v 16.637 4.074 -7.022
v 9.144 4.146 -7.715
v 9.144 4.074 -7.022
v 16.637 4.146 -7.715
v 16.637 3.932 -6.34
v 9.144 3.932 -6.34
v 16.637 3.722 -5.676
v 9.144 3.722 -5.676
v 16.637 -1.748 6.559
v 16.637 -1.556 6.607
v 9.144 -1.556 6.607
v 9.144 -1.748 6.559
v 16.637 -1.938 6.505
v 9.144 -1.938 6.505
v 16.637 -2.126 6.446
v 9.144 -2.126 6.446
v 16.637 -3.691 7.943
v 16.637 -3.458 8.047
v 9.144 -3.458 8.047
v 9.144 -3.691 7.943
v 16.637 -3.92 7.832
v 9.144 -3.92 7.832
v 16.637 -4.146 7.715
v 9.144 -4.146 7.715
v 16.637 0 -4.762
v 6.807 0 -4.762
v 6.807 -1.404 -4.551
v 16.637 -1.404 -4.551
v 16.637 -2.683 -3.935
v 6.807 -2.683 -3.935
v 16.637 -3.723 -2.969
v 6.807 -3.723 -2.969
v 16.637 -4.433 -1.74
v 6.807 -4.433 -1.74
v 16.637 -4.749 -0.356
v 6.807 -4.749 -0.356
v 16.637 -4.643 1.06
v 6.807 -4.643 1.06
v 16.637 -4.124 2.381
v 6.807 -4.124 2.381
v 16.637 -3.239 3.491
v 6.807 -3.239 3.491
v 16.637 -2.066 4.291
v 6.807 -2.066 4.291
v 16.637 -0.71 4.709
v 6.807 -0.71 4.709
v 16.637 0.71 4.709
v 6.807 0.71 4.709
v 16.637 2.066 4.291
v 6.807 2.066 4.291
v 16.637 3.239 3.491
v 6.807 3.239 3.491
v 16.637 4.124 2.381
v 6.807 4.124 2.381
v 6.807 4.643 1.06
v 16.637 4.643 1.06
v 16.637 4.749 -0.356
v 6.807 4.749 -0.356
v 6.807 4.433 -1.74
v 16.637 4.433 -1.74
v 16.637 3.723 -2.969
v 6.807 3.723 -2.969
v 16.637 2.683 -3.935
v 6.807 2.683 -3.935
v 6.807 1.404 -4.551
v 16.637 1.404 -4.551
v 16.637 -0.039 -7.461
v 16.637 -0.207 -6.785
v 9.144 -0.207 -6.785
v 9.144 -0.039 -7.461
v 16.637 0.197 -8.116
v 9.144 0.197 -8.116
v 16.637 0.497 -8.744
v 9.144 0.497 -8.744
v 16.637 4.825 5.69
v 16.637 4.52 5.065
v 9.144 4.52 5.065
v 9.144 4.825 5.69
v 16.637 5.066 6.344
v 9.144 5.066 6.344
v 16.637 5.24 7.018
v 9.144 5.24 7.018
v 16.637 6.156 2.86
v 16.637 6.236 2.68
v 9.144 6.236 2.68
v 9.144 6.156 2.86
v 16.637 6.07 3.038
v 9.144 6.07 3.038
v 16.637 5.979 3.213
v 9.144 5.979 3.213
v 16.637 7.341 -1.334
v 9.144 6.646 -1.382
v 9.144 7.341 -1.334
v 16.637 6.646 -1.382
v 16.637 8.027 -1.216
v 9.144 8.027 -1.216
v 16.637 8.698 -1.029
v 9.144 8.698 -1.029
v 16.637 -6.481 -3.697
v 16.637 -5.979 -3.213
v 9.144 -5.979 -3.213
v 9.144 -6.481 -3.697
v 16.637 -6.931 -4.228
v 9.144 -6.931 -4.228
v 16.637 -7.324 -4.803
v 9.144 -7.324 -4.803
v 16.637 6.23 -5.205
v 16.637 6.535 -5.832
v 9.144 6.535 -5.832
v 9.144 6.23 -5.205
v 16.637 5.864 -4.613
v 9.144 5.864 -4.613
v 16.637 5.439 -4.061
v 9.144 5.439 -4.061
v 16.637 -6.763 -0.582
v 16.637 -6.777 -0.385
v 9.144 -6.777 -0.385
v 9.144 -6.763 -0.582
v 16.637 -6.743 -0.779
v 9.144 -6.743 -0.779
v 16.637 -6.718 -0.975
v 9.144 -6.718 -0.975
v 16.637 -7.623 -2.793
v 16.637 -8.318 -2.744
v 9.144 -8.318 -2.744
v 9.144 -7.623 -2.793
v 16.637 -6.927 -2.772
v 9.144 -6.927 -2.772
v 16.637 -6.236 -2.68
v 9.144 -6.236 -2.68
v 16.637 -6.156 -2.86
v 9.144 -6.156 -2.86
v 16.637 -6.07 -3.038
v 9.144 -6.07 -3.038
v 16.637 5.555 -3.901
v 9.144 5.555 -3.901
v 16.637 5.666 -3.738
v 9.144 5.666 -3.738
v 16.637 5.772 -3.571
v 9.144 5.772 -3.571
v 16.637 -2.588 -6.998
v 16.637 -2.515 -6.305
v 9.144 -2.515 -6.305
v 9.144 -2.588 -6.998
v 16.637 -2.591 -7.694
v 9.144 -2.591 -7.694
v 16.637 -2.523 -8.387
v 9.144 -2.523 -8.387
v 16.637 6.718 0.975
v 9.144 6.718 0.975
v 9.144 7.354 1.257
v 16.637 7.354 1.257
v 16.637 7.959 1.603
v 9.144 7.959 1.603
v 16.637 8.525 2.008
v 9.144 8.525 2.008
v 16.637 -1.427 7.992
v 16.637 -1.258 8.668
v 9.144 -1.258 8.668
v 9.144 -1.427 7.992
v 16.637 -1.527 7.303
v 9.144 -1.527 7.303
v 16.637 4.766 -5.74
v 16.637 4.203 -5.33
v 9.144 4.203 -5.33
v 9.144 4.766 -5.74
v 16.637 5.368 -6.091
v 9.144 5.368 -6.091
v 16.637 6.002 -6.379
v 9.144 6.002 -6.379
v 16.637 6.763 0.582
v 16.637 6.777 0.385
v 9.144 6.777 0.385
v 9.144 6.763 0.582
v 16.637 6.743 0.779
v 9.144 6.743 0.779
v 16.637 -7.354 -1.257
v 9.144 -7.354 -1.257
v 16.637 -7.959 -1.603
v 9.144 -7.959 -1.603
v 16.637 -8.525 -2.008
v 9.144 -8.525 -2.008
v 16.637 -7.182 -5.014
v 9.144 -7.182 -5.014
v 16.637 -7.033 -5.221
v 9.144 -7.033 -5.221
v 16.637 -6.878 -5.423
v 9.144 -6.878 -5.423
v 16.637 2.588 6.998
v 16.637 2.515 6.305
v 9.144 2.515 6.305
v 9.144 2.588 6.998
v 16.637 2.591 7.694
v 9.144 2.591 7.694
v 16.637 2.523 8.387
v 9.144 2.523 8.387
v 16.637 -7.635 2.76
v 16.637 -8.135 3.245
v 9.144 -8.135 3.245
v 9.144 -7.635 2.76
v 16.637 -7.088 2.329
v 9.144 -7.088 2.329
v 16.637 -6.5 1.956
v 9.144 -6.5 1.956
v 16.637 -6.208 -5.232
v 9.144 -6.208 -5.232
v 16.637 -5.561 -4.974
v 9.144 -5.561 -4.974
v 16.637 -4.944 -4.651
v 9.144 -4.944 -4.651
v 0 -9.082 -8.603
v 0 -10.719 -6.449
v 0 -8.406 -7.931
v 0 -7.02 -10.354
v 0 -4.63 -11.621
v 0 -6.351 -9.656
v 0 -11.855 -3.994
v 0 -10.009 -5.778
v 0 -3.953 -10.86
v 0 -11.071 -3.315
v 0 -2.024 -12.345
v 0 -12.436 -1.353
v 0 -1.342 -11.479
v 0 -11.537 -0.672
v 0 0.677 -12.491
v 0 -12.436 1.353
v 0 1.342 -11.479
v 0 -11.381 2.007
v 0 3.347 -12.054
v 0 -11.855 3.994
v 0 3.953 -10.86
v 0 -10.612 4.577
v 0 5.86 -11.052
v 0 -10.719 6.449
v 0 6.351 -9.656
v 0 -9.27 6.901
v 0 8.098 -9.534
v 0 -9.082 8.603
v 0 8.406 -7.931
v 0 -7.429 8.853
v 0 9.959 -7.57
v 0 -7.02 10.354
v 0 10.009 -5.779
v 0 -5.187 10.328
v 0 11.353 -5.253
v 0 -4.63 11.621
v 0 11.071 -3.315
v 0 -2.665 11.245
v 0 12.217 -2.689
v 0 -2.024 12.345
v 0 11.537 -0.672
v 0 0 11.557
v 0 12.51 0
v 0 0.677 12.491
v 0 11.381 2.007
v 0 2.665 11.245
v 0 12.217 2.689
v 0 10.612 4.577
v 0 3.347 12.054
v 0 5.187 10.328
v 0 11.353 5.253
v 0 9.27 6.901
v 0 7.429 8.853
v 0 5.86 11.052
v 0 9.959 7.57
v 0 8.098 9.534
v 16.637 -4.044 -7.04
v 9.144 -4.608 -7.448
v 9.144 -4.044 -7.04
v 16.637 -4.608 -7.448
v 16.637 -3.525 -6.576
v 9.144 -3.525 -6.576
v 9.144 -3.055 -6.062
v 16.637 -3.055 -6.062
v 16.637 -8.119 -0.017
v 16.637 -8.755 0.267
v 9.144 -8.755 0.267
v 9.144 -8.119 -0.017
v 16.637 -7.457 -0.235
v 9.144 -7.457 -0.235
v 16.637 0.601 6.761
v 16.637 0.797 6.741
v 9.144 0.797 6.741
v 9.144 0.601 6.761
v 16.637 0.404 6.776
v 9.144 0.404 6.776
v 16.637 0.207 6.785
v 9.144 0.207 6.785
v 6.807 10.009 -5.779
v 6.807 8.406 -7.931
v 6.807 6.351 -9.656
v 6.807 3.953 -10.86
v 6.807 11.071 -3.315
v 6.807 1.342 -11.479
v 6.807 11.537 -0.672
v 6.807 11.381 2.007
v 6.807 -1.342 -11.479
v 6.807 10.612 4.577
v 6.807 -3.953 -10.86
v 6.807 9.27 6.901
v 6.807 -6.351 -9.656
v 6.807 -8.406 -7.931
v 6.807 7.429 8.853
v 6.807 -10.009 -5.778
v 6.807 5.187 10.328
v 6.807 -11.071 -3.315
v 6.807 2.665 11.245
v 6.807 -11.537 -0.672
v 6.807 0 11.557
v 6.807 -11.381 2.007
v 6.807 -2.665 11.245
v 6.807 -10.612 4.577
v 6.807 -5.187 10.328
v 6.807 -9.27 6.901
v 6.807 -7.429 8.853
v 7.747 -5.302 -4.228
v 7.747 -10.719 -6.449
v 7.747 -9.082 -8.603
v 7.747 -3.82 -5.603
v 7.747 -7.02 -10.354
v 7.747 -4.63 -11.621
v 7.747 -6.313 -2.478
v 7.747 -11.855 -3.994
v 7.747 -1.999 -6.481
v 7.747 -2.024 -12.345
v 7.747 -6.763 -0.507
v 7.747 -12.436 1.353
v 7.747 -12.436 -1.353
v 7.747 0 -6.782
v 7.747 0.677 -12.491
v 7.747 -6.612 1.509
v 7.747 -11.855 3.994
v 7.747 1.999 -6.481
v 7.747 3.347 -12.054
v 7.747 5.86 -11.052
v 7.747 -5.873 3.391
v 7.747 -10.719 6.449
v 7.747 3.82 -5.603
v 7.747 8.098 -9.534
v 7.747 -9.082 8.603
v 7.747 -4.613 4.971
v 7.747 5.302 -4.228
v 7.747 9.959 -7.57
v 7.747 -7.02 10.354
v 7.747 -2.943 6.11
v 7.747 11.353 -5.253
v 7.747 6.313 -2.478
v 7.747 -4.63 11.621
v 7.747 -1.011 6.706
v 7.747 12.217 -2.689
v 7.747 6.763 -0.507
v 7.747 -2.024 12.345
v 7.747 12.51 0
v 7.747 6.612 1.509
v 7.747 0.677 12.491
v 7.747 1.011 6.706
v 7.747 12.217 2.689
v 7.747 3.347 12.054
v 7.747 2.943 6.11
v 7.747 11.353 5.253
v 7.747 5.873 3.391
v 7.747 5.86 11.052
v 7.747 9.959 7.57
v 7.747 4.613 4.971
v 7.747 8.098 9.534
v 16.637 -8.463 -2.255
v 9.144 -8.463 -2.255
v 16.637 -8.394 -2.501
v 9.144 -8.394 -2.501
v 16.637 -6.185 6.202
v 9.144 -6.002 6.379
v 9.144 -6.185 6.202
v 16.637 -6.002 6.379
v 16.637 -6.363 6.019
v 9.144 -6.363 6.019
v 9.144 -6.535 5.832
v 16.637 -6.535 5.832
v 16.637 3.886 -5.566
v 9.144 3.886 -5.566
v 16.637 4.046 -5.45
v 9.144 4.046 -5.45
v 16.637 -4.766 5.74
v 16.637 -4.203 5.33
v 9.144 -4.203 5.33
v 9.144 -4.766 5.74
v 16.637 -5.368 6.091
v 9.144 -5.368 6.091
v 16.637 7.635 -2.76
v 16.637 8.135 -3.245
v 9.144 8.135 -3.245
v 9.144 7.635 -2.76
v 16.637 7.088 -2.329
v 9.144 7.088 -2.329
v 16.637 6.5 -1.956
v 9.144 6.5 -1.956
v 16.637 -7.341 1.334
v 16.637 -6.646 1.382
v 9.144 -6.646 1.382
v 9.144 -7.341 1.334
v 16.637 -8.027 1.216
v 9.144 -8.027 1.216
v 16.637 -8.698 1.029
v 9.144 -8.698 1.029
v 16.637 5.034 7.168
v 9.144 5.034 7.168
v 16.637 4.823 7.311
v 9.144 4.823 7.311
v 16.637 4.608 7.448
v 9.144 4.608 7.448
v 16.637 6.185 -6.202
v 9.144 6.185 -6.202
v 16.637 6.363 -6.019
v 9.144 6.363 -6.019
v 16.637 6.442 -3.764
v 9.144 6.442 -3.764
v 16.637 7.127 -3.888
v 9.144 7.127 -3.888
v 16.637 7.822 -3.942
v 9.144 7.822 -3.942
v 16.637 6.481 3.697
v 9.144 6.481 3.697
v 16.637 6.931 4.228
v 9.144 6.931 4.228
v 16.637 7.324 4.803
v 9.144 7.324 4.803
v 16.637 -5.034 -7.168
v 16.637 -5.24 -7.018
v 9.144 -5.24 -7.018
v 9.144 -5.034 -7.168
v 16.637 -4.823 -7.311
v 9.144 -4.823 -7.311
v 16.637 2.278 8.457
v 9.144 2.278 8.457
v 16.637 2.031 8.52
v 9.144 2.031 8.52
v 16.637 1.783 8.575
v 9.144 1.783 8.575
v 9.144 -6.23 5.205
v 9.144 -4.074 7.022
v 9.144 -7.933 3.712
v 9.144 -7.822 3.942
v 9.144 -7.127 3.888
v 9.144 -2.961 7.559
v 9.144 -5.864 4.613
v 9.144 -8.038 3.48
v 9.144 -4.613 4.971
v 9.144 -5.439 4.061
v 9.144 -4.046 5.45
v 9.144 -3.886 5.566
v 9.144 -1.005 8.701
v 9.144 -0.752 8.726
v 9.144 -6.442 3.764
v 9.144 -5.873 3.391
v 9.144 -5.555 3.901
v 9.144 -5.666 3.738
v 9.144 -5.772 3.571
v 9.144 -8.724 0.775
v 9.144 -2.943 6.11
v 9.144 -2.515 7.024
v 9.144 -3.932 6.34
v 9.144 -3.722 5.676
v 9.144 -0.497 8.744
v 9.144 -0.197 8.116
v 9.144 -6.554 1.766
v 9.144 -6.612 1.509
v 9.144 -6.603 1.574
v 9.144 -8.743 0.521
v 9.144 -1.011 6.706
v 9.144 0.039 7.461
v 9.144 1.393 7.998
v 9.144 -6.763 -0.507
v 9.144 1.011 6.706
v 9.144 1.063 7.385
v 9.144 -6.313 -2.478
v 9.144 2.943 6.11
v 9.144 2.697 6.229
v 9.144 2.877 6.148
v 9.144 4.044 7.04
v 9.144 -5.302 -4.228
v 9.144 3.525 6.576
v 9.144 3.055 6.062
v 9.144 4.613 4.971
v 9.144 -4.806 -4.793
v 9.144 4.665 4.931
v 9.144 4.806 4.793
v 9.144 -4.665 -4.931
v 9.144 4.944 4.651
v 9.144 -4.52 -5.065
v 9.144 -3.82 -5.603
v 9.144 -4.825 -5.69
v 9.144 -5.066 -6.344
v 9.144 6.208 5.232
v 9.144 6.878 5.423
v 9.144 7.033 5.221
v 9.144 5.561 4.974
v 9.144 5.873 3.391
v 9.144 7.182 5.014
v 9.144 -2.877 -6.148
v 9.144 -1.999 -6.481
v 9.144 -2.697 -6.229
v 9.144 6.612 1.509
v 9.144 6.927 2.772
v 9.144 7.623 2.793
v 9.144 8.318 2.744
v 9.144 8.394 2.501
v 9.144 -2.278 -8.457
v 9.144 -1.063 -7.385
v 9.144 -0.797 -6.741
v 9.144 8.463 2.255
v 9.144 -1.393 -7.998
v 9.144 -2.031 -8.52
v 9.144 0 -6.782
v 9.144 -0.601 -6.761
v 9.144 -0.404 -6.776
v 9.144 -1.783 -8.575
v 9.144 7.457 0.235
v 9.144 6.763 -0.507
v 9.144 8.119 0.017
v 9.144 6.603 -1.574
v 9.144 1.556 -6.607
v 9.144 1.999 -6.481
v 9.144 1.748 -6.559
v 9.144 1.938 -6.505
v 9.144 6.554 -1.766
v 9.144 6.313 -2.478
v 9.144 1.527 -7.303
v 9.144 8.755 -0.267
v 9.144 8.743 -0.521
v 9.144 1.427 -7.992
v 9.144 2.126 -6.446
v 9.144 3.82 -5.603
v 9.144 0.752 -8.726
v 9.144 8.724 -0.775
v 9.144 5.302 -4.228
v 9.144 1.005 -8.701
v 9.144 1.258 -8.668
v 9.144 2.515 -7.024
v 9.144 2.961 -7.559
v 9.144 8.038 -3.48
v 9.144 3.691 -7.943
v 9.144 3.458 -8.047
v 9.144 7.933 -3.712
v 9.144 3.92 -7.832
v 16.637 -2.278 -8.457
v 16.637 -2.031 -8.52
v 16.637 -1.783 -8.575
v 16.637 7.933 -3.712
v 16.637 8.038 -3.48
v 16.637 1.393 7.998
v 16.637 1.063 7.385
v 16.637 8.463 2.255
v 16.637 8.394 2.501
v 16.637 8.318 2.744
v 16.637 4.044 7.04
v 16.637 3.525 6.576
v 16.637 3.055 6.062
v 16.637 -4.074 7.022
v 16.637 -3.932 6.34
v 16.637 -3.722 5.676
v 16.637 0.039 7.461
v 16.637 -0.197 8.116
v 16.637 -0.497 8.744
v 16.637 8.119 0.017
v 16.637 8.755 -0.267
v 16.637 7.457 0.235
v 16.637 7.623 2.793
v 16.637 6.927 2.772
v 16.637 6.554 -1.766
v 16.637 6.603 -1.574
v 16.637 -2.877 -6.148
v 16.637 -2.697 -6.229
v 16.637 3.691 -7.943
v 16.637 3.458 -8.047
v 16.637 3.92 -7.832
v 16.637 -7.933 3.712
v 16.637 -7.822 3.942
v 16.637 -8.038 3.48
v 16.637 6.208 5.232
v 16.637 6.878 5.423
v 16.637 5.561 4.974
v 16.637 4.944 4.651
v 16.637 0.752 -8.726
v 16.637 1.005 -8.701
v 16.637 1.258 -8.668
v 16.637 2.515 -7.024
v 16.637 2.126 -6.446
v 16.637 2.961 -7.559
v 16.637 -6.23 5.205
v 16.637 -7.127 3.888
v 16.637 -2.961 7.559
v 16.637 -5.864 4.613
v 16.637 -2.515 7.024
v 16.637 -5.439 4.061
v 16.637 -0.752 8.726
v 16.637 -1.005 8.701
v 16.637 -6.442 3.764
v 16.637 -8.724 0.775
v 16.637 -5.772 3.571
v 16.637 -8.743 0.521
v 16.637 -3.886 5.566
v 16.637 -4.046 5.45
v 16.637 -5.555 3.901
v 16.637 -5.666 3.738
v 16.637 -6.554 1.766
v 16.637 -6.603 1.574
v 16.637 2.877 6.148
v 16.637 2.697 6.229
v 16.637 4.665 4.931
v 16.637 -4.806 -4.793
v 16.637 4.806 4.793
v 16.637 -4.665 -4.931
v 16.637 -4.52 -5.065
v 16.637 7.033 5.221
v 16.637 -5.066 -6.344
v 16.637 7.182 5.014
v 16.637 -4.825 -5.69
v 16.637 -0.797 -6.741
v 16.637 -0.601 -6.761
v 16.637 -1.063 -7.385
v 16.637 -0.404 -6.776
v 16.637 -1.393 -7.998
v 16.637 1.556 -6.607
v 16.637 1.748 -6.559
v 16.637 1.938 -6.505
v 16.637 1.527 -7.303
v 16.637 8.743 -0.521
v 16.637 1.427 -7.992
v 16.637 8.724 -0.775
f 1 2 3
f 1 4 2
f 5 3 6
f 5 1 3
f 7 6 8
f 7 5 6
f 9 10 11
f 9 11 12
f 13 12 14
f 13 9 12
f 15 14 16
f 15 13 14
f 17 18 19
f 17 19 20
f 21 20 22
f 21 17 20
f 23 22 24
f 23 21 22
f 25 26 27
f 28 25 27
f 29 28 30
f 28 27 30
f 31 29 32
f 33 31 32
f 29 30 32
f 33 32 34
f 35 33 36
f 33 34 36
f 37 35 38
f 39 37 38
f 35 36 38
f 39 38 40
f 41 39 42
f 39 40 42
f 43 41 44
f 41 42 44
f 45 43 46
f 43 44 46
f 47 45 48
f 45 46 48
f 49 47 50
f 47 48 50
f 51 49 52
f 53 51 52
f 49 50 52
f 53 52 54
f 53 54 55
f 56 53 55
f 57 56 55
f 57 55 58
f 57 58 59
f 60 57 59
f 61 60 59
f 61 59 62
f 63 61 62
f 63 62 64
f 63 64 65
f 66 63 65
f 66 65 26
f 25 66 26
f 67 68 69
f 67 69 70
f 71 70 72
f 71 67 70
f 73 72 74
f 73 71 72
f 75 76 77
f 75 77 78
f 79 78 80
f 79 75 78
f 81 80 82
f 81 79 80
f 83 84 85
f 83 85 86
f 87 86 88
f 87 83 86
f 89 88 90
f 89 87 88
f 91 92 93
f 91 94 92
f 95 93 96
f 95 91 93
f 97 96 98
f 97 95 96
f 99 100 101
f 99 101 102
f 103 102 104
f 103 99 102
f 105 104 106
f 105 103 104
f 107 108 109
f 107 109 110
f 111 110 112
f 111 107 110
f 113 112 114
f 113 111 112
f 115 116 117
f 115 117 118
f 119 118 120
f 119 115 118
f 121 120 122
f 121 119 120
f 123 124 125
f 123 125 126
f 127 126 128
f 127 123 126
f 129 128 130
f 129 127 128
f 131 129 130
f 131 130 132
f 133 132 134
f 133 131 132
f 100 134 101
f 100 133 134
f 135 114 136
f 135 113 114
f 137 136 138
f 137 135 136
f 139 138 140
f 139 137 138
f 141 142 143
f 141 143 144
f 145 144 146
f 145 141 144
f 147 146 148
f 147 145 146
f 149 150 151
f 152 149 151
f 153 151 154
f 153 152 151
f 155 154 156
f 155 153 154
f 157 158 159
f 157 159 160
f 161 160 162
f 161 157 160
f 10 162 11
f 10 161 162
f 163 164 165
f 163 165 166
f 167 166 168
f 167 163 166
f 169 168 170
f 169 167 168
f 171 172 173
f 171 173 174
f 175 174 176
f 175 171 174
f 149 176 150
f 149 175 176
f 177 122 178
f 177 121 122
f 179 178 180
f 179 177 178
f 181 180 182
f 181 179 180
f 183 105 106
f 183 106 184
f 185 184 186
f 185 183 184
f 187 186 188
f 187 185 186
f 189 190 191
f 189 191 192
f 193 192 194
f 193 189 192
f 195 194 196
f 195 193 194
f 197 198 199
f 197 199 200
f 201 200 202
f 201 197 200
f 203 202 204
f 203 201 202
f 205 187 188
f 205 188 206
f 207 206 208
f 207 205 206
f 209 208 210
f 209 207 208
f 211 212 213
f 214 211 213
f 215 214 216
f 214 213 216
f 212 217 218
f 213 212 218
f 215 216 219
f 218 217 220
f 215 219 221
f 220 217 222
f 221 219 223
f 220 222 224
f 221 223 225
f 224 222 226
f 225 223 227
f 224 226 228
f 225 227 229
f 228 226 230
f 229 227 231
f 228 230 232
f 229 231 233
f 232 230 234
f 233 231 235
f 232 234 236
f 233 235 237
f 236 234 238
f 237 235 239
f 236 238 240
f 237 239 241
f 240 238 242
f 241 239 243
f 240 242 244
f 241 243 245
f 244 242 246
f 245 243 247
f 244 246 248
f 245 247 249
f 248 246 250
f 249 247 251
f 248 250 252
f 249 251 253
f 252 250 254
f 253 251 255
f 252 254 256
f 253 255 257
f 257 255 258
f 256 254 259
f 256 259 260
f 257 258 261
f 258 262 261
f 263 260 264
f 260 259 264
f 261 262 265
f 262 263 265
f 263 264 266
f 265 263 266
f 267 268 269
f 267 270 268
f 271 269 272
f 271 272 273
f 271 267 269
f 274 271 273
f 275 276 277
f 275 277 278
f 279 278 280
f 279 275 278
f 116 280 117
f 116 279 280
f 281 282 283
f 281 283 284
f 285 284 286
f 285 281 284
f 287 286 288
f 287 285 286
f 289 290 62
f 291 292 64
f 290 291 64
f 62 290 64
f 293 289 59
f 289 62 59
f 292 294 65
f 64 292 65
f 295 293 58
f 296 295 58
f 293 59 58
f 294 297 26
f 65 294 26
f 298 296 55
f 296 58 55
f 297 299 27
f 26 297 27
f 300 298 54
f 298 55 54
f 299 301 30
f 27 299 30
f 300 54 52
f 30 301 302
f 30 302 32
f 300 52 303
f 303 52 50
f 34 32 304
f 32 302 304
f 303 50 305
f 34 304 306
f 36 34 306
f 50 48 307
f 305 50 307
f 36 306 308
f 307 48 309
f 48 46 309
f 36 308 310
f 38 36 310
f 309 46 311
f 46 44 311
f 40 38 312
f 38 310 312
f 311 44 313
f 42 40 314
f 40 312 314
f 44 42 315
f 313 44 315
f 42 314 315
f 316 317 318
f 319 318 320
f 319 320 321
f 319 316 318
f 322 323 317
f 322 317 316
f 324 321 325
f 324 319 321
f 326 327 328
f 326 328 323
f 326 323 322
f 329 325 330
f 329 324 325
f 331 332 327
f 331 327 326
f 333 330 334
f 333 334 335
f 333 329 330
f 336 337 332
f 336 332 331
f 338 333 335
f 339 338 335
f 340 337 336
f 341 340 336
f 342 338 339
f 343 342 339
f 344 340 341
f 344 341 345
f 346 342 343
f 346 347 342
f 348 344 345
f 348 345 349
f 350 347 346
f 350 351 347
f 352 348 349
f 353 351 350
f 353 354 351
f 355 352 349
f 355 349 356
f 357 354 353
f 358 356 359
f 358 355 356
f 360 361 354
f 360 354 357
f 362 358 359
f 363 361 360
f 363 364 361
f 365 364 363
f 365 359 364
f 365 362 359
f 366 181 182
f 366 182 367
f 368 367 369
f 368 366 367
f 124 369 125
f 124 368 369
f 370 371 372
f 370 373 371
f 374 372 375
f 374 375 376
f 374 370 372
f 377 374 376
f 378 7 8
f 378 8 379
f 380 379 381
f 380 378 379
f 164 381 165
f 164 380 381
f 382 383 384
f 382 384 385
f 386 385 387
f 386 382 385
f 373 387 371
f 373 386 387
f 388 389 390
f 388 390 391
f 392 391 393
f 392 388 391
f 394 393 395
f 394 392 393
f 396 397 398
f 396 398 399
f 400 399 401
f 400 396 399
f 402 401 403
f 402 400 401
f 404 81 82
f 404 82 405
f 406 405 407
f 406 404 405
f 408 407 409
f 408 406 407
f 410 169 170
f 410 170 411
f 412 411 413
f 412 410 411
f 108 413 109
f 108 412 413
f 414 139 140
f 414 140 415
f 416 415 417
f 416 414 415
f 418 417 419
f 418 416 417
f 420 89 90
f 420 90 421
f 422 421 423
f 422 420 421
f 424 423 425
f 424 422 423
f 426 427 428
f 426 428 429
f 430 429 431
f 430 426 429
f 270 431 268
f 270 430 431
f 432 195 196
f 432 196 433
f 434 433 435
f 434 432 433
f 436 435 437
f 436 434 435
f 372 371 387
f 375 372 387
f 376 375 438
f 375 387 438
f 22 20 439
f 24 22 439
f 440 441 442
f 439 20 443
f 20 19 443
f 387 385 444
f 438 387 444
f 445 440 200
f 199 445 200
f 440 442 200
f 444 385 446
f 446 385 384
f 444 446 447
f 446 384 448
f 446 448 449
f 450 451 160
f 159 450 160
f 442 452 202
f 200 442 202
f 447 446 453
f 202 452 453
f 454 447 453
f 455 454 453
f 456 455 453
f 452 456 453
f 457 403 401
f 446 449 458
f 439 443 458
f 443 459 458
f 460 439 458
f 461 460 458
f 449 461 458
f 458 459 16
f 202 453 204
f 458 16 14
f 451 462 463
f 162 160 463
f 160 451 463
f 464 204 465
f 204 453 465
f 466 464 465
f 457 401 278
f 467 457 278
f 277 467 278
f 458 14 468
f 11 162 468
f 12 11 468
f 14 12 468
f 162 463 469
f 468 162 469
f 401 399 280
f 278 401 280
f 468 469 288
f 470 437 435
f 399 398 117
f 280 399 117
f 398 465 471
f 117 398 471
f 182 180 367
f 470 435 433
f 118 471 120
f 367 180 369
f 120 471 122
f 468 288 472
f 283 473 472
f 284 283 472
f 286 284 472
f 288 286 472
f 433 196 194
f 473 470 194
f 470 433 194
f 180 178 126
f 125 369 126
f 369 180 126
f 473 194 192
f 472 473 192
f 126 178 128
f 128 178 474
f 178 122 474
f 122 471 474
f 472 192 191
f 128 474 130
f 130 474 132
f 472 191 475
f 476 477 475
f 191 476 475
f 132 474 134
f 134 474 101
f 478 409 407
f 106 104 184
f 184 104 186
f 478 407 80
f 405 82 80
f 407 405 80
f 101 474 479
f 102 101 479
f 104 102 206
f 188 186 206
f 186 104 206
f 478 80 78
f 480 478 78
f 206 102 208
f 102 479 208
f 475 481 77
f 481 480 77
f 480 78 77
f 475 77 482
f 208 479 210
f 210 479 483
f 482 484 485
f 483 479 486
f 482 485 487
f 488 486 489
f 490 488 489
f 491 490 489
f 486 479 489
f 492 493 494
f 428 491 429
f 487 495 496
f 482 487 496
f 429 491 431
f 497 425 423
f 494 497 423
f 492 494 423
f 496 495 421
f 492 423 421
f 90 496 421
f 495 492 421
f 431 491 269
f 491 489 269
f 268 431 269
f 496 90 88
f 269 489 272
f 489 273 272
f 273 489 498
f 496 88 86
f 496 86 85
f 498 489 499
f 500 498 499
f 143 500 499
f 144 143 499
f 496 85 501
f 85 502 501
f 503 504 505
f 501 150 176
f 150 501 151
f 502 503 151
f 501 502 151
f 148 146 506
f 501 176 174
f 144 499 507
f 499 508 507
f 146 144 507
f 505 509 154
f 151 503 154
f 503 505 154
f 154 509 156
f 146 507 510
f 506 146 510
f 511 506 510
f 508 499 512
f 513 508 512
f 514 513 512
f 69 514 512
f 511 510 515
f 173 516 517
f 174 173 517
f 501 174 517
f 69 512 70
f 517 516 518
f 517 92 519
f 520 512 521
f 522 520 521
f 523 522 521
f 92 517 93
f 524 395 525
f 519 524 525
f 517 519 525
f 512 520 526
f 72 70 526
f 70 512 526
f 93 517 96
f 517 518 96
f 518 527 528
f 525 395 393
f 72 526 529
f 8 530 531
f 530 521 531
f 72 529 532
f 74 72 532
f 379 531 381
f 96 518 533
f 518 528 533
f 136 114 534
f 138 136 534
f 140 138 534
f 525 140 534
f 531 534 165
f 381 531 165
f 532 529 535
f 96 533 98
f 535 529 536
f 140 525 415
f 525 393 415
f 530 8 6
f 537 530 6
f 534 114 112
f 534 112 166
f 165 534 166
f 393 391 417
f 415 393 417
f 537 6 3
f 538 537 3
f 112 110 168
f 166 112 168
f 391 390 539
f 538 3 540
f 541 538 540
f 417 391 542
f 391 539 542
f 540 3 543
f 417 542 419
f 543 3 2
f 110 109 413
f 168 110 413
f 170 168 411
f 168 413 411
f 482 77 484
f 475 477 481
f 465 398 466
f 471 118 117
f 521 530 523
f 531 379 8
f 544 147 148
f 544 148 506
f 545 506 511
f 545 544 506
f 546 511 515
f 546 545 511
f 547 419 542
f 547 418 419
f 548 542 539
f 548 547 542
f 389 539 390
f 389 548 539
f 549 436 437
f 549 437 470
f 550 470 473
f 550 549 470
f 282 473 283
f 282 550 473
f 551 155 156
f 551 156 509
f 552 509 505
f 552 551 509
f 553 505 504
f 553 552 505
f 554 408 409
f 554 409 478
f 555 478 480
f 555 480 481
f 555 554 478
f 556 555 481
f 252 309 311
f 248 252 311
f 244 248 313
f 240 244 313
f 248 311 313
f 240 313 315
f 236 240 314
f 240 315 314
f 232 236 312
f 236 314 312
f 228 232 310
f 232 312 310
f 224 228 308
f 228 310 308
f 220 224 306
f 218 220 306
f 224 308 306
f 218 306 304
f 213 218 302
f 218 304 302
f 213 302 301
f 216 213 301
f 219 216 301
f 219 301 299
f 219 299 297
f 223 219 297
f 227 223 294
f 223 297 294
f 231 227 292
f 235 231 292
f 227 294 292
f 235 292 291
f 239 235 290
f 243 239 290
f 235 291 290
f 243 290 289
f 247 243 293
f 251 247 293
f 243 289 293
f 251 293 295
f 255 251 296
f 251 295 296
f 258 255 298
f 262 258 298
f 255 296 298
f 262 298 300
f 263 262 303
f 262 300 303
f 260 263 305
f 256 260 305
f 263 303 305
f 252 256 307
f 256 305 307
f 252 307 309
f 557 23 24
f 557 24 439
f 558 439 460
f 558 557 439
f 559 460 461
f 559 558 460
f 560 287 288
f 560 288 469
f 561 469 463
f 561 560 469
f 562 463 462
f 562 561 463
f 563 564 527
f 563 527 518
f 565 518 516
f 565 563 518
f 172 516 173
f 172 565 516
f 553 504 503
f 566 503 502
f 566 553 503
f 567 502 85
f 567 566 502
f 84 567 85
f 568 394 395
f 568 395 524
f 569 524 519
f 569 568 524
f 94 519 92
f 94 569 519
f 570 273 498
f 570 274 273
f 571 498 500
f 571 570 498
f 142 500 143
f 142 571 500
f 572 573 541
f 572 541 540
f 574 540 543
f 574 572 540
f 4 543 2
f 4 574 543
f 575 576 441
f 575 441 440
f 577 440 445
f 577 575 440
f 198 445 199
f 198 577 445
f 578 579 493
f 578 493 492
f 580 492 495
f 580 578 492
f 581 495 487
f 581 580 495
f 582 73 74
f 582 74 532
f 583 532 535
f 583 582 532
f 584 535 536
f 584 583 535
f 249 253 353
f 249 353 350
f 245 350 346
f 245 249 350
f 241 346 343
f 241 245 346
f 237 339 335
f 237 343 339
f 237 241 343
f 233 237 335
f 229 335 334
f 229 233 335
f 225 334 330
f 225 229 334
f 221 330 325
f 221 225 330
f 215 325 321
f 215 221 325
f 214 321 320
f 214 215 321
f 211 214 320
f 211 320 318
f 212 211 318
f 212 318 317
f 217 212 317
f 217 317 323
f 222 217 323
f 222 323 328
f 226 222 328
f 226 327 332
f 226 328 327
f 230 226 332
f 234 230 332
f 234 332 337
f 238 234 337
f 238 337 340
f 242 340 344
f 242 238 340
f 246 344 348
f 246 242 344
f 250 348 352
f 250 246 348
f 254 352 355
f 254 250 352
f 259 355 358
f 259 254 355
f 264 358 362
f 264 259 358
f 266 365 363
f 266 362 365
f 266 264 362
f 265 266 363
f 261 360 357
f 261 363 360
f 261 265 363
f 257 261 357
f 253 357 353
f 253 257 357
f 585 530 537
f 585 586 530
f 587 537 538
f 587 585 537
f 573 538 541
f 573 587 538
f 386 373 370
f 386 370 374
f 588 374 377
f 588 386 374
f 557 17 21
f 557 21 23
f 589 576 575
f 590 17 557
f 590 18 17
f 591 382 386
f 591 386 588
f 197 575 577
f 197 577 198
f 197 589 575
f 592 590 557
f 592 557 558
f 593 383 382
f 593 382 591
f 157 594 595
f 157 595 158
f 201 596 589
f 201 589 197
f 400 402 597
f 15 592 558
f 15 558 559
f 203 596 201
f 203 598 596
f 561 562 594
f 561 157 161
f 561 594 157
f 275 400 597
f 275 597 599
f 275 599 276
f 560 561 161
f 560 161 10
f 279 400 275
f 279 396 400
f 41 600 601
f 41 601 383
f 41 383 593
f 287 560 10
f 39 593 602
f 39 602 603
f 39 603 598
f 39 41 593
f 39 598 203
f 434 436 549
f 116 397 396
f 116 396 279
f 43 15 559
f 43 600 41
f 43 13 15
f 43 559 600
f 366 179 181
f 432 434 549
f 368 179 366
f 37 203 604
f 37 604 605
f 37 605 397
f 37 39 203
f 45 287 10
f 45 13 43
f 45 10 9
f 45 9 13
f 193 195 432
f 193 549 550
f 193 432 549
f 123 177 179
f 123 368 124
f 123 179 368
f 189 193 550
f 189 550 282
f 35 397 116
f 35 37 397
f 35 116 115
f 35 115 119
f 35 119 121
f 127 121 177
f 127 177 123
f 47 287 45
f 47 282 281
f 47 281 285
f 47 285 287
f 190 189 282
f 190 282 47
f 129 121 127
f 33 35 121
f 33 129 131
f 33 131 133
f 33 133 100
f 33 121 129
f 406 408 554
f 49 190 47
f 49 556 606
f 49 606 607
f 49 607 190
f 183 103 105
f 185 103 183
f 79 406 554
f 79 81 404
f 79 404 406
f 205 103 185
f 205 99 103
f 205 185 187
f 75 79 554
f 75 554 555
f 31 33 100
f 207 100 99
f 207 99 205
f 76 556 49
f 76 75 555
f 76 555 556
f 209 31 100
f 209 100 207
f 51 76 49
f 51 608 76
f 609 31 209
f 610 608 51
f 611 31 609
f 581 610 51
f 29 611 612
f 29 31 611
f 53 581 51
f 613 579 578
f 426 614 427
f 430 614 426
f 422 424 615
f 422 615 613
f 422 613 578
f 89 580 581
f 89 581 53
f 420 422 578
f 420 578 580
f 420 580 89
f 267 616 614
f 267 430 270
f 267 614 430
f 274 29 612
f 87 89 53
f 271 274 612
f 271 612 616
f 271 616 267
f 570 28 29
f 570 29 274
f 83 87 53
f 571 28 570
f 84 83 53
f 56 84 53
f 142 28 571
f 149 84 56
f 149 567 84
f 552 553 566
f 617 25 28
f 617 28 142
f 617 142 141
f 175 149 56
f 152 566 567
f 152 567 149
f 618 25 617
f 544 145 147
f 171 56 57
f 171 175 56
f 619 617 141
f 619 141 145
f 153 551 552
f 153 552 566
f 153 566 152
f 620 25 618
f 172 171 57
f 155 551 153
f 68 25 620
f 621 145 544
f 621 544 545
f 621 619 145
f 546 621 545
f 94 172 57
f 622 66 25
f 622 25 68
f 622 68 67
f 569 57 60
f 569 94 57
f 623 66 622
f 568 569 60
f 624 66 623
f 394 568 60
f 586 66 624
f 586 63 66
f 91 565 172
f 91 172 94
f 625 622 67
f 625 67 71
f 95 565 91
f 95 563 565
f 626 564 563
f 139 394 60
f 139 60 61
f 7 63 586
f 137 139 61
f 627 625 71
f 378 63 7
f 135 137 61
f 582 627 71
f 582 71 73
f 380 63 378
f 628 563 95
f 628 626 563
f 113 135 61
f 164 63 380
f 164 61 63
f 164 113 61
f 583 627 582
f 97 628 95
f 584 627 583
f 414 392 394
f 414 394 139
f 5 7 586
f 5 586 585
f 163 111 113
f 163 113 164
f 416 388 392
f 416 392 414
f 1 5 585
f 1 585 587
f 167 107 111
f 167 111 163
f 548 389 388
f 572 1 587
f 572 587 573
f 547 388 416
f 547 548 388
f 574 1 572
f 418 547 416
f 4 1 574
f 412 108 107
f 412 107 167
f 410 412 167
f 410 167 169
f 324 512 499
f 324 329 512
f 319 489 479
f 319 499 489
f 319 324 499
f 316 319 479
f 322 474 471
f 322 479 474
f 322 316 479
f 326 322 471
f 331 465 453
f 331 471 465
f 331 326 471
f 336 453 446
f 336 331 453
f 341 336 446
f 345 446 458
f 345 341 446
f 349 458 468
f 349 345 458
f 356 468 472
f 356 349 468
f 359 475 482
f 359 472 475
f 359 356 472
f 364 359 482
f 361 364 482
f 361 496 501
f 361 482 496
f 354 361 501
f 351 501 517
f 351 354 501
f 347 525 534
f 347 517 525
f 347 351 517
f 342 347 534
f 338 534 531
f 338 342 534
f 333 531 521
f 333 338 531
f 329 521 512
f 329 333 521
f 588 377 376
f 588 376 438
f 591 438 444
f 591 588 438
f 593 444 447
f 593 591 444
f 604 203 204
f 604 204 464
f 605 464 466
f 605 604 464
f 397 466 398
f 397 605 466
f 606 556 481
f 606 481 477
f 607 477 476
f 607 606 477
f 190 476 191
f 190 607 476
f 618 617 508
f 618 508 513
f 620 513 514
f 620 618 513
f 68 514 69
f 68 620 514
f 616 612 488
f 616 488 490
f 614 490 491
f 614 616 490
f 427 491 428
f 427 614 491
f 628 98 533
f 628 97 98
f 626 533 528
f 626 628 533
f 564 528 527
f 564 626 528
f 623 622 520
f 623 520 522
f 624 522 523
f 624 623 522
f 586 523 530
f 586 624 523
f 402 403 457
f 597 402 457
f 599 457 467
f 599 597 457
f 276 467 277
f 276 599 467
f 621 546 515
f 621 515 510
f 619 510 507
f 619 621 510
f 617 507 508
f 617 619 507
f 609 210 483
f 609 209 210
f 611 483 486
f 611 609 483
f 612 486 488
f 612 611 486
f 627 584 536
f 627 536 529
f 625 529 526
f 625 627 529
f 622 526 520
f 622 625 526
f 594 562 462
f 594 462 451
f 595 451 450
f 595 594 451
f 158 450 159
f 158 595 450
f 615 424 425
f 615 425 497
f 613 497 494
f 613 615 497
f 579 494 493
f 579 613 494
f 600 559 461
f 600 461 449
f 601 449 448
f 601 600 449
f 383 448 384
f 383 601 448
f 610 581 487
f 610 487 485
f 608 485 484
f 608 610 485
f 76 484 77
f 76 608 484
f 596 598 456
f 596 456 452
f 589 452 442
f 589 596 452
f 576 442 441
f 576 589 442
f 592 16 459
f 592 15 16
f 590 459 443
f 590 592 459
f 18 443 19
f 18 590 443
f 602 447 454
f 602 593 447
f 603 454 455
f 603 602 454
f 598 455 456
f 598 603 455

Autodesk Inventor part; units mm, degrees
ref_plane "YZ Plane" through (0, 0, 0) normal (1, 0, 0) x (0, 1, 0)
ref_plane "XZ Plane" through (0, 0, 0) normal (0, 1, 0) x (-1, 0, 0)
ref_plane "XY Plane" through (0, 0, 0) normal (0, 0, 1) x (1, 0, 0)
sketch "Sketch1" plane through (0, 0, 0) normal (1, 0, 0) x (0, 1, 0)
  circle A0 centre (0, 0) radius 12.5095
  dimension "d0" = 25.019
extrude "Extrusion1" add sketch "Sketch1" along normal blind 7.747
sketch "Sketch3" plane through (7.747, 0, 0) normal (1, 0, 0) x (0, 0, -1)
  circle A0 centre (0, 0) radius 12.5095 projected
  circle A1 centre (0, 0) radius 8.763
  dimension "d3" = 17.526
extrude "Extrusion2" add sketch "Sketch3" along normal blind 8.89 contours A1
sketch "Sketch4" plane through (7.747, 0, 0) normal (1, 0, 0) x (0, 0, -1)
  circle A0 centre (0, 0) radius 8.763 projected
  circle A1 centre (0, 0) radius 6.7818
  dimension "d26" = 6.7818
extrude "Extrusion3" cut sketch "Sketch4" along normal blind 1.397
sketch "Sketch5" plane through (16.637, 0, 0) normal (1, 0, 0) x (0, 0, -1)
  circle A0 centre (0, 0) radius 8.763 projected
hole "Hole1" at (16.637, 0, 0) direction (-1, 0, 0) diameter 9.525 end through all
sketch "Sketch6" plane through (0, 0, 0) normal (-1, 0, 0) x (0, 0, 1)
  circle A0 centre (0, 0) radius 4.7625 projected
hole "Hole2" at (0, 0, 0) direction (1, 0, 0) diameter 23.114 depth 6.8072
sketch "Sketch7" plane through (16.637, 0, 0) normal (1, 0, 0) x (0, 0, -1)
  circle A0 centre (0, 0) radius 8.763 projected
  arc A1 (6.3049, -2.5147) -> (8.3872, -2.5234) centre (7.3744, 4.2693) ccw
  arc A2 (8.3872, -2.5234) -> (8.5753, -1.7828) centre (0, 0) ccw
  arc A3 (8.5753, -1.7828) -> (6.741, -0.7972) centre (4.445, -7.2699) ccw
  arc A4 (6.741, -0.7972) -> (6.7848, -0.2067) centre (0, 0) ccw
  arc A5 (6.7848, -0.2067) -> (8.7445, 0.4974) centre (5.4695, 6.534) ccw
  arc A6 (8.7445, 0.4974) -> (8.6679, 1.2576) centre (0, 0) ccw
  arc A7 (8.6679, 1.2576) -> (6.6071, 1.5564) centre (6.6633, -5.3112) ccw
  arc A8 (6.6071, 1.5564) -> (6.4463, 2.1263) centre (0, 0) ccw
  arc A9 (6.4463, 2.1263) -> (8.047, 3.4581) centre (2.9049, 8.0107) ccw
  arc A10 (8.047, 3.4581) -> (7.715, 4.1463) centre (0, 0) ccw
  arc A11 (7.715, 4.1463) -> (5.6763, 3.7223) centre (8.078, -2.7119) ccw
  arc A12 (5.6763, 3.7223) -> (5.3303, 4.2029) centre (0, 0) ccw
  arc A13 (5.3303, 4.2029) -> (6.379, 6.0018) centre (-0.0101, 8.5211) ccw
  arc A14 (6.379, 6.0018) -> (5.8316, 6.535) centre (0, 0) ccw
  arc A15 (5.8316, 6.535) -> (4.0609, 5.4392) centre (8.5184, 0.2145) ccw
  arc A16 (4.0609, 5.4392) -> (3.5714, 5.7725) centre (0, 0) ccw
  arc A17 (3.5714, 5.7725) -> (3.9415, 7.8216) centre (-2.9239, 8.0037) ccw
  arc A18 (3.9415, 7.8216) -> (3.2448, 8.1354) centre (0, 0) ccw
  arc A19 (3.2448, 8.1354) -> (1.9557, 6.5001) centre (7.9313, 3.115) ccw
  arc A20 (1.9557, 6.5001) -> (1.3817, 6.6458) centre (0, 0) ccw
  arc A21 (1.3817, 6.6458) -> (1.0287, 8.698) centre (-5.485, 6.521) ccw
  arc A22 (1.0287, 8.698) -> (0.2667, 8.7546) centre (0, 0) ccw
  arc A23 (0.2667, 8.7546) -> (-0.3854, 6.777) centre (6.3876, 5.6398) ccw
  arc A24 (-0.3854, 6.777) -> (-0.9746, 6.7176) centre (0, 0) ccw
  arc A25 (-0.9746, 6.7176) -> (-2.0083, 8.5253) centre (-7.3845, 4.2518) ccw
  arc A26 (-2.0083, 8.5253) -> (-2.7436, 8.3178) centre (0, 0) ccw
  arc A27 (-2.7436, 8.3178) -> (-2.6801, 6.2364) centre (4.0734, 7.4844) ccw
  arc A28 (-2.6801, 6.2364) -> (-3.2134, 5.9791) centre (0, 0) ccw
  arc A29 (-3.2134, 5.9791) -> (-4.803, 7.3243) centre (-8.3934, 1.4697) ccw
  arc A30 (-4.803, 7.3243) -> (-5.423, 6.8778) centre (0, 0) ccw
  arc A31 (-5.423, 6.8778) -> (-4.6514, 4.9437) centre (1.268, 8.4262) ccw
  arc A32 (-4.6514, 4.9437) -> (-5.0646, 4.5195) centre (0, 0) ccw
  arc A33 (-5.0646, 4.5195) -> (-7.0184, 5.2399) centre (-8.3899, -1.4896) ccw
  arc A34 (-7.0184, 5.2399) -> (-7.4483, 4.6082) centre (0, 0) ccw
  arc A35 (-7.4483, 4.6082) -> (-6.0618, 3.0547) centre (-1.6904, 8.3517) ccw
  arc A36 (-6.0618, 3.0547) -> (-6.3049, 2.5147) centre (0, 0) ccw
  arc A37 (-6.3049, 2.5147) -> (-8.3872, 2.5234) centre (-7.3744, -4.2693) ccw
  arc A38 (-8.3872, 2.5234) -> (-8.5753, 1.7828) centre (0, 0) ccw
  arc A39 (-8.5753, 1.7828) -> (-6.741, 0.7972) centre (-4.445, 7.2699) ccw
  arc A40 (-6.741, 0.7972) -> (-6.7848, 0.2067) centre (0, 0) ccw
  arc A41 (-6.7848, 0.2067) -> (-8.7445, -0.4974) centre (-5.4695, -6.534) ccw
  arc A42 (-8.7445, -0.4974) -> (-8.6679, -1.2576) centre (0, 0) ccw
  arc A43 (-8.6679, -1.2576) -> (-6.6071, -1.5564) centre (-6.6633, 5.3112) ccw
  arc A44 (-6.6071, -1.5564) -> (-6.4463, -2.1263) centre (0, 0) ccw
  arc A45 (-6.4463, -2.1263) -> (-8.047, -3.4581) centre (-2.9049, -8.0107) ccw
  arc A46 (-8.047, -3.4581) -> (-7.715, -4.1463) centre (0, 0) ccw
  arc A47 (-7.715, -4.1463) -> (-5.6763, -3.7223) centre (-8.078, 2.7119) ccw
  arc A48 (-5.6763, -3.7223) -> (-5.3303, -4.2029) centre (0, 0) ccw
  arc A49 (-5.3303, -4.2029) -> (-6.379, -6.0018) centre (0.0101, -8.5211) ccw
  arc A50 (-6.379, -6.0018) -> (-5.8316, -6.535) centre (0, 0) ccw
  arc A51 (-5.8316, -6.535) -> (-4.0609, -5.4392) centre (-8.5184, -0.2145) ccw
  arc A52 (-4.0609, -5.4392) -> (-3.5714, -5.7725) centre (0, 0) ccw
  arc A53 (-3.5714, -5.7725) -> (-3.9415, -7.8216) centre (2.9239, -8.0037) ccw
  arc A54 (-3.9415, -7.8216) -> (-3.2448, -8.1354) centre (0, 0) ccw
  arc A55 (-3.2448, -8.1354) -> (-1.9557, -6.5001) centre (-7.9313, -3.115) ccw
  arc A56 (-1.9557, -6.5001) -> (-1.3817, -6.6458) centre (0, 0) ccw
  arc A57 (-1.3817, -6.6458) -> (-1.0287, -8.698) centre (5.485, -6.521) ccw
  arc A58 (-1.0287, -8.698) -> (-0.2667, -8.7546) centre (0, 0) ccw
  arc A59 (-0.2667, -8.7546) -> (0.3854, -6.777) centre (-6.3876, -5.6398) ccw
  arc A60 (0.3854, -6.777) -> (0.9746, -6.7176) centre (0, 0) ccw
  arc A61 (0.9746, -6.7176) -> (2.0083, -8.5253) centre (7.3845, -4.2518) ccw
  arc A62 (2.0083, -8.5253) -> (2.7436, -8.3178) centre (0, 0) ccw
  arc A63 (2.7436, -8.3178) -> (2.6801, -6.2364) centre (-4.0734, -7.4844) ccw
  arc A64 (2.6801, -6.2364) -> (3.2134, -5.9791) centre (0, 0) ccw
  arc A65 (3.2134, -5.9791) -> (4.803, -7.3243) centre (8.3934, -1.4697) ccw
  arc A66 (4.803, -7.3243) -> (5.423, -6.8778) centre (0, 0) ccw
  arc A67 (5.423, -6.8778) -> (4.6514, -4.9437) centre (-1.268, -8.4262) ccw
  arc A68 (4.6514, -4.9437) -> (5.0646, -4.5195) centre (0, 0) ccw
  arc A69 (5.0646, -4.5195) -> (7.0184, -5.2399) centre (8.3899, 1.4896) ccw
  arc A70 (7.0184, -5.2399) -> (7.4483, -4.6082) centre (0, 0) ccw
  arc A71 (7.4483, -4.6082) -> (6.0618, -3.0547) centre (1.6904, -8.3517) ccw
  arc A72 (6.0618, -3.0547) -> (6.3049, -2.5147) centre (0, 0) ccw
extrude "Extrusion4" cut sketch "Sketch7" against normal up to surface (7.493 mm away)
properties part number "Clutch Gear" material "Stainless Steel, 440C"
